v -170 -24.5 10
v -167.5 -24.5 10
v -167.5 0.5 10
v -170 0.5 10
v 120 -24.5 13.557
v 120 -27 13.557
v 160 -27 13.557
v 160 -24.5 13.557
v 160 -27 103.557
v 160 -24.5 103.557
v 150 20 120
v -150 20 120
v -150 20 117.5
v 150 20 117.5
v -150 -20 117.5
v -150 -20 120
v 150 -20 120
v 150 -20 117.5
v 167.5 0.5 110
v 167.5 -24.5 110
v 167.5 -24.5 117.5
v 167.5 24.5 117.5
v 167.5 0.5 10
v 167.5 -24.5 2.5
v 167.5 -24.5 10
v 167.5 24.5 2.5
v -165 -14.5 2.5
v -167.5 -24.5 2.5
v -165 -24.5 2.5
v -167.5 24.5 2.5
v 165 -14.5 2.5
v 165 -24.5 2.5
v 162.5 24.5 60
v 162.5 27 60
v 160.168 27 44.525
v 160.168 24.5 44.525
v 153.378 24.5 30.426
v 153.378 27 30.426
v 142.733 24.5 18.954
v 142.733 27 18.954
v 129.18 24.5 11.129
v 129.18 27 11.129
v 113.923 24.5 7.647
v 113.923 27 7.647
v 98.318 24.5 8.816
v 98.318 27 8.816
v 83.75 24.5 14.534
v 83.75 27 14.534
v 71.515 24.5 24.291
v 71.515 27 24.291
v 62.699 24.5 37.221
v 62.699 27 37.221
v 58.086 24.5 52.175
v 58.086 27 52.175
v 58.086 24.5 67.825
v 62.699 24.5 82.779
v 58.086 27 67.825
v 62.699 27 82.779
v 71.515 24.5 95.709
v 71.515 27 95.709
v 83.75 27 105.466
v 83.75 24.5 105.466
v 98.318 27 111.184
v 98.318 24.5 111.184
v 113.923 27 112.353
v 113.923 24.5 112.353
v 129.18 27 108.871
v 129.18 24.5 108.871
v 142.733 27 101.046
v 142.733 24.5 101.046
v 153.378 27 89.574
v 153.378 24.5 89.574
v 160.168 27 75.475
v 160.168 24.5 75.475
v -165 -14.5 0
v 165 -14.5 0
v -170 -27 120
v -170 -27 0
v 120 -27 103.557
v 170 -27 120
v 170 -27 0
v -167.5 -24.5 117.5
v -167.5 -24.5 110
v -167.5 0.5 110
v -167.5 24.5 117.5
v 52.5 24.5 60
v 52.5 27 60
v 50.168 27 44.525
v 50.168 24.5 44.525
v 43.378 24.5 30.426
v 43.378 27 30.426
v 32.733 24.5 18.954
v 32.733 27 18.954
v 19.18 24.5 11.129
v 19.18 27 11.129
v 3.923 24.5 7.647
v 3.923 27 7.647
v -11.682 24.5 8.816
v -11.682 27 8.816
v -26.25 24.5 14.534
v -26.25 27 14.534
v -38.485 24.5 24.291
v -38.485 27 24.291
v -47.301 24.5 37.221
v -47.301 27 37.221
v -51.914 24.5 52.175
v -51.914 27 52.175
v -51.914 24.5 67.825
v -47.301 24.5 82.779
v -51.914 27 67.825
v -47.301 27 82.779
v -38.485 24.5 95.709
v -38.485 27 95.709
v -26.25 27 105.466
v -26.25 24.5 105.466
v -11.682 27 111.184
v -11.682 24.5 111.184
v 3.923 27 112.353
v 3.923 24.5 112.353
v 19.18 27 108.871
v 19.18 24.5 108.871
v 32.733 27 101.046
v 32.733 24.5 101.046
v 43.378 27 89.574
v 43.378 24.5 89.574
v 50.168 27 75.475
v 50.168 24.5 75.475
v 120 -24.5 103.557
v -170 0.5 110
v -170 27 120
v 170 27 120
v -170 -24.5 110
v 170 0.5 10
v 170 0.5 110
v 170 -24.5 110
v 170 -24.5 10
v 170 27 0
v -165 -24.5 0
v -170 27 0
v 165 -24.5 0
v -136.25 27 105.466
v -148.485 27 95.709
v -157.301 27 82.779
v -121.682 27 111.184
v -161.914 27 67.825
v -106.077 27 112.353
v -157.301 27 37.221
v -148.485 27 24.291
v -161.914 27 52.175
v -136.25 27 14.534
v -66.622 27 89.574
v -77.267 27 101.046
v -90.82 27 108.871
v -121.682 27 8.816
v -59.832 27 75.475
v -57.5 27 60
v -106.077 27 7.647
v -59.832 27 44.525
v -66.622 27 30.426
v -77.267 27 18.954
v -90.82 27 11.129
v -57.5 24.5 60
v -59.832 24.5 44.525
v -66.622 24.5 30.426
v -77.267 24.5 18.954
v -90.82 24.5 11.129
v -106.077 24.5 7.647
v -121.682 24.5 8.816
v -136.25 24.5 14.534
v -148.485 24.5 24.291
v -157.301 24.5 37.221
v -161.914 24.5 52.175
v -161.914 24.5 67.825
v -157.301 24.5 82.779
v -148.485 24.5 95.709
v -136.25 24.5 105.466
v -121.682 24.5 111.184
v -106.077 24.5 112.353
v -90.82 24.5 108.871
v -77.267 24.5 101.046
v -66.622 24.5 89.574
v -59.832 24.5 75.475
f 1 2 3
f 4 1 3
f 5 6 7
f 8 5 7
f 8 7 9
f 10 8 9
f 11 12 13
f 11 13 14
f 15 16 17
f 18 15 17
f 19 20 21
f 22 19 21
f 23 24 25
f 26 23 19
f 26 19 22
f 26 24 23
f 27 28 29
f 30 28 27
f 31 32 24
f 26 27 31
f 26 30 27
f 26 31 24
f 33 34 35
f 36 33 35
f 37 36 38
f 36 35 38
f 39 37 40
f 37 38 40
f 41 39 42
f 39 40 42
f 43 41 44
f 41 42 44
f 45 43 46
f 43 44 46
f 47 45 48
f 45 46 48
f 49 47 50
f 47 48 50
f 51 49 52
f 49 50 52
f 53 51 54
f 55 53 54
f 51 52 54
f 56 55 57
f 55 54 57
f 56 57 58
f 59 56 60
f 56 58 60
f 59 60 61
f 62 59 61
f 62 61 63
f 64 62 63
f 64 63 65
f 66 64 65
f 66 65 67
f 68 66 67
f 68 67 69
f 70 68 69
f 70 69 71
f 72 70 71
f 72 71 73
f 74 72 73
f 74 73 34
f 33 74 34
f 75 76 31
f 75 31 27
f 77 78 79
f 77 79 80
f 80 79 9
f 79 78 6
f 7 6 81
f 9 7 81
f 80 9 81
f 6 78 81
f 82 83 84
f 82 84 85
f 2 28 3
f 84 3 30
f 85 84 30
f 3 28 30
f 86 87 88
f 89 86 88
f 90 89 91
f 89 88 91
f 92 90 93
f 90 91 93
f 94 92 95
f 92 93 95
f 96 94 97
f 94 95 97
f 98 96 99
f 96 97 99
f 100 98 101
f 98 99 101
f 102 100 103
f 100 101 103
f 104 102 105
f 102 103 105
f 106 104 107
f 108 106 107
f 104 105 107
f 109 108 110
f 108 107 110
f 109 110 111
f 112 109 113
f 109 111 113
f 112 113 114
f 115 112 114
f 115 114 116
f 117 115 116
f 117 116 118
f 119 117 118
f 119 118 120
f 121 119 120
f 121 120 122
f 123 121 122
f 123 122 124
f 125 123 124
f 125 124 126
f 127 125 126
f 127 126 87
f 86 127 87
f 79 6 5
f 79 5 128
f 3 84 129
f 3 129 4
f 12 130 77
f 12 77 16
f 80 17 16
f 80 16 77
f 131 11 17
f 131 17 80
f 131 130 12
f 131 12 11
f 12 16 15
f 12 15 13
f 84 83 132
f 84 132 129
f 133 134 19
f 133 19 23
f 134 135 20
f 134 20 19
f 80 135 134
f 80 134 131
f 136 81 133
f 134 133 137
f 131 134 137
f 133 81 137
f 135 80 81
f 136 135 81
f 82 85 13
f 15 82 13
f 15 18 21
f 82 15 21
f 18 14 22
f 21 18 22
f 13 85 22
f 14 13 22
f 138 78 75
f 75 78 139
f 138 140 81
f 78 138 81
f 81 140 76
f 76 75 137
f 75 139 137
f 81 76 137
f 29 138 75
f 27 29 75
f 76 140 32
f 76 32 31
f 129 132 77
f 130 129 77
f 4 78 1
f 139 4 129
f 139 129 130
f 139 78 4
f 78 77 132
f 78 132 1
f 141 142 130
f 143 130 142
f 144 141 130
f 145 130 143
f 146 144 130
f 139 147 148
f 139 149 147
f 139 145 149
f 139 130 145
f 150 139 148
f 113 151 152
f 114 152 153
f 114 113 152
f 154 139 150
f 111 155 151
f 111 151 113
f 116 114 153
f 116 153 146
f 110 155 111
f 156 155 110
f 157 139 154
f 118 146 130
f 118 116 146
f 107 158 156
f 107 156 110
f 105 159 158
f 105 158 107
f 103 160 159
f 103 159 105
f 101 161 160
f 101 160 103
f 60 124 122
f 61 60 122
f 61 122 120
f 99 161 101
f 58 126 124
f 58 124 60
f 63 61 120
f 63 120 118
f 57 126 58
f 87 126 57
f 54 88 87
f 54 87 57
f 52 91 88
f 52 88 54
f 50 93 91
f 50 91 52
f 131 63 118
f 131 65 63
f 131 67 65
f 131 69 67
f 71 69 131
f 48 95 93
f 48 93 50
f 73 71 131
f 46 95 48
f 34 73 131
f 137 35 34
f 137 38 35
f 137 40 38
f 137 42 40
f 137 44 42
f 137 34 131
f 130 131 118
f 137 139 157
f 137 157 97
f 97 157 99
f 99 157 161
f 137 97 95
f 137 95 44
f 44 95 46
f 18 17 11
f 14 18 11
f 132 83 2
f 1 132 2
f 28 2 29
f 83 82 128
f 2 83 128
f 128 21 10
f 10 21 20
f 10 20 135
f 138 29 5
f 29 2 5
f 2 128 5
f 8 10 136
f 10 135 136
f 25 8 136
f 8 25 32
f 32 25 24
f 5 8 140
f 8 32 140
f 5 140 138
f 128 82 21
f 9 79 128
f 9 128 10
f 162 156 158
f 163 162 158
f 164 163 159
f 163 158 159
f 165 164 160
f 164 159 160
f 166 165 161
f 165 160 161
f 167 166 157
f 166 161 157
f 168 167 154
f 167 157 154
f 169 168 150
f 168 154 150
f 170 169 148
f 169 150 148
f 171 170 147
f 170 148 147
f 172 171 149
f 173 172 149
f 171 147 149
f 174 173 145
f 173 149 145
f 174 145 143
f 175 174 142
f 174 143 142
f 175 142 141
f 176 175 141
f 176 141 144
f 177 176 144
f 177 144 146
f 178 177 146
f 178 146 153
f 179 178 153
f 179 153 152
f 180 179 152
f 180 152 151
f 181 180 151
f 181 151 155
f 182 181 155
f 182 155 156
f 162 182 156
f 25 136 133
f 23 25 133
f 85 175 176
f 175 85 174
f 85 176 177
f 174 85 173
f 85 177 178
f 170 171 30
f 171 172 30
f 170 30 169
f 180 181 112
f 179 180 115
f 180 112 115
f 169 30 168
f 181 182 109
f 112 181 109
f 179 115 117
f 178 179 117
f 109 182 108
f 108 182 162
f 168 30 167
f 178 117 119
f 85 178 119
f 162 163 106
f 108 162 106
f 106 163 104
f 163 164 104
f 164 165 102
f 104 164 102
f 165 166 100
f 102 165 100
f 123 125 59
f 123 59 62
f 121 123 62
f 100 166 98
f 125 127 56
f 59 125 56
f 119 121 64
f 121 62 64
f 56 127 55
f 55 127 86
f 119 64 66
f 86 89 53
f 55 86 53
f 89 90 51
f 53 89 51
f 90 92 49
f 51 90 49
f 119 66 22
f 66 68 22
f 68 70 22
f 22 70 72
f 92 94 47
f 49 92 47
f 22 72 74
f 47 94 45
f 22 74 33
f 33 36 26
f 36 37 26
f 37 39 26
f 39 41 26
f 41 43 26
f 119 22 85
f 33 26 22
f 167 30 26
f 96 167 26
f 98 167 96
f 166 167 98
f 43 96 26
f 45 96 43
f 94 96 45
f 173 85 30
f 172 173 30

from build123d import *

# Parameters (mm, degrees)
SKETCH1_W           = 340
SKETCH1_H           = 54
BOSS_EXTRUDE1_DEPTH = 120
SHELL1_T            = 2.5
SKETCH2_R           = 52.5
CUT_EXTRUDE1_DEPTH  = 10
SKETCH3_W           = 300
SKETCH3_H           = 40
CUT_EXTRUDE2_DEPTH  = 10
SKETCH4_W           = 100
SKETCH4_H           = 25
CUT_EXTRUDE3_DEPTH  = 341
SKETCH5_W           = 40
SKETCH5_H           = 90
CUT_EXTRUDE4_DEPTH  = 10
SKETCH6_W           = 330
SKETCH6_H           = 10
CUT_EXTRUDE5_DEPTH  = 10


with BuildPart() as part:
    # Sketch1 → Boss-Extrude1 (new body)
    with BuildSketch(Plane.XY):
        Rectangle(SKETCH1_W, SKETCH1_H)
    extrude(amount=BOSS_EXTRUDE1_DEPTH)

    # Shell1 (no face opened: a closed hollow body)
    add(offset(amount=-SHELL1_T, mode=Mode.PRIVATE), mode=Mode.SUBTRACT)

    # Sketch2 → Cut-Extrude1 (cut)
    with BuildSketch(Plane(origin=(0, 27, 0), x_dir=(1, 0, 0), z_dir=(0, 1, 0))):
        with Locations((-110, -60)):
            Circle(SKETCH2_R)
        with Locations((0, -60)):
            Circle(SKETCH2_R)
        with Locations((110, -60)):
            Circle(SKETCH2_R)
    extrude(amount=-CUT_EXTRUDE1_DEPTH, mode=Mode.SUBTRACT)

    # Sketch3 → Cut-Extrude2 (cut)
    with BuildSketch(Plane.XY.offset(120)):
        Rectangle(SKETCH3_W, SKETCH3_H)
    extrude(amount=-CUT_EXTRUDE2_DEPTH, mode=Mode.SUBTRACT)

    # Sketch4 → Cut-Extrude3 (cut, through all)
    with BuildSketch(Plane(origin=(170, 0, 0), x_dir=(0, 0, -1), z_dir=(1, 0, 0))):
        with Locations((-60, -12)):
            Rectangle(SKETCH4_W, SKETCH4_H)
    extrude(amount=-CUT_EXTRUDE3_DEPTH, mode=Mode.SUBTRACT)

    # Sketch5 → Cut-Extrude4 (cut)
    with BuildSketch(Plane.XZ.offset(27)):
        with Locations((140, 58.55655344)):
            Rectangle(SKETCH5_W, SKETCH5_H)
    extrude(amount=-CUT_EXTRUDE4_DEPTH, mode=Mode.SUBTRACT)

    # Sketch6 → Cut-Extrude5 (cut)
    with BuildSketch(Plane(origin=(0, 0, 0), x_dir=(-1, 0, 0), z_dir=(0, 0, -1))):
        with Locations((0, -19.5)):
            Rectangle(SKETCH6_W, SKETCH6_H)
    extrude(amount=-CUT_EXTRUDE5_DEPTH, mode=Mode.SUBTRACT)


solid = part.part
